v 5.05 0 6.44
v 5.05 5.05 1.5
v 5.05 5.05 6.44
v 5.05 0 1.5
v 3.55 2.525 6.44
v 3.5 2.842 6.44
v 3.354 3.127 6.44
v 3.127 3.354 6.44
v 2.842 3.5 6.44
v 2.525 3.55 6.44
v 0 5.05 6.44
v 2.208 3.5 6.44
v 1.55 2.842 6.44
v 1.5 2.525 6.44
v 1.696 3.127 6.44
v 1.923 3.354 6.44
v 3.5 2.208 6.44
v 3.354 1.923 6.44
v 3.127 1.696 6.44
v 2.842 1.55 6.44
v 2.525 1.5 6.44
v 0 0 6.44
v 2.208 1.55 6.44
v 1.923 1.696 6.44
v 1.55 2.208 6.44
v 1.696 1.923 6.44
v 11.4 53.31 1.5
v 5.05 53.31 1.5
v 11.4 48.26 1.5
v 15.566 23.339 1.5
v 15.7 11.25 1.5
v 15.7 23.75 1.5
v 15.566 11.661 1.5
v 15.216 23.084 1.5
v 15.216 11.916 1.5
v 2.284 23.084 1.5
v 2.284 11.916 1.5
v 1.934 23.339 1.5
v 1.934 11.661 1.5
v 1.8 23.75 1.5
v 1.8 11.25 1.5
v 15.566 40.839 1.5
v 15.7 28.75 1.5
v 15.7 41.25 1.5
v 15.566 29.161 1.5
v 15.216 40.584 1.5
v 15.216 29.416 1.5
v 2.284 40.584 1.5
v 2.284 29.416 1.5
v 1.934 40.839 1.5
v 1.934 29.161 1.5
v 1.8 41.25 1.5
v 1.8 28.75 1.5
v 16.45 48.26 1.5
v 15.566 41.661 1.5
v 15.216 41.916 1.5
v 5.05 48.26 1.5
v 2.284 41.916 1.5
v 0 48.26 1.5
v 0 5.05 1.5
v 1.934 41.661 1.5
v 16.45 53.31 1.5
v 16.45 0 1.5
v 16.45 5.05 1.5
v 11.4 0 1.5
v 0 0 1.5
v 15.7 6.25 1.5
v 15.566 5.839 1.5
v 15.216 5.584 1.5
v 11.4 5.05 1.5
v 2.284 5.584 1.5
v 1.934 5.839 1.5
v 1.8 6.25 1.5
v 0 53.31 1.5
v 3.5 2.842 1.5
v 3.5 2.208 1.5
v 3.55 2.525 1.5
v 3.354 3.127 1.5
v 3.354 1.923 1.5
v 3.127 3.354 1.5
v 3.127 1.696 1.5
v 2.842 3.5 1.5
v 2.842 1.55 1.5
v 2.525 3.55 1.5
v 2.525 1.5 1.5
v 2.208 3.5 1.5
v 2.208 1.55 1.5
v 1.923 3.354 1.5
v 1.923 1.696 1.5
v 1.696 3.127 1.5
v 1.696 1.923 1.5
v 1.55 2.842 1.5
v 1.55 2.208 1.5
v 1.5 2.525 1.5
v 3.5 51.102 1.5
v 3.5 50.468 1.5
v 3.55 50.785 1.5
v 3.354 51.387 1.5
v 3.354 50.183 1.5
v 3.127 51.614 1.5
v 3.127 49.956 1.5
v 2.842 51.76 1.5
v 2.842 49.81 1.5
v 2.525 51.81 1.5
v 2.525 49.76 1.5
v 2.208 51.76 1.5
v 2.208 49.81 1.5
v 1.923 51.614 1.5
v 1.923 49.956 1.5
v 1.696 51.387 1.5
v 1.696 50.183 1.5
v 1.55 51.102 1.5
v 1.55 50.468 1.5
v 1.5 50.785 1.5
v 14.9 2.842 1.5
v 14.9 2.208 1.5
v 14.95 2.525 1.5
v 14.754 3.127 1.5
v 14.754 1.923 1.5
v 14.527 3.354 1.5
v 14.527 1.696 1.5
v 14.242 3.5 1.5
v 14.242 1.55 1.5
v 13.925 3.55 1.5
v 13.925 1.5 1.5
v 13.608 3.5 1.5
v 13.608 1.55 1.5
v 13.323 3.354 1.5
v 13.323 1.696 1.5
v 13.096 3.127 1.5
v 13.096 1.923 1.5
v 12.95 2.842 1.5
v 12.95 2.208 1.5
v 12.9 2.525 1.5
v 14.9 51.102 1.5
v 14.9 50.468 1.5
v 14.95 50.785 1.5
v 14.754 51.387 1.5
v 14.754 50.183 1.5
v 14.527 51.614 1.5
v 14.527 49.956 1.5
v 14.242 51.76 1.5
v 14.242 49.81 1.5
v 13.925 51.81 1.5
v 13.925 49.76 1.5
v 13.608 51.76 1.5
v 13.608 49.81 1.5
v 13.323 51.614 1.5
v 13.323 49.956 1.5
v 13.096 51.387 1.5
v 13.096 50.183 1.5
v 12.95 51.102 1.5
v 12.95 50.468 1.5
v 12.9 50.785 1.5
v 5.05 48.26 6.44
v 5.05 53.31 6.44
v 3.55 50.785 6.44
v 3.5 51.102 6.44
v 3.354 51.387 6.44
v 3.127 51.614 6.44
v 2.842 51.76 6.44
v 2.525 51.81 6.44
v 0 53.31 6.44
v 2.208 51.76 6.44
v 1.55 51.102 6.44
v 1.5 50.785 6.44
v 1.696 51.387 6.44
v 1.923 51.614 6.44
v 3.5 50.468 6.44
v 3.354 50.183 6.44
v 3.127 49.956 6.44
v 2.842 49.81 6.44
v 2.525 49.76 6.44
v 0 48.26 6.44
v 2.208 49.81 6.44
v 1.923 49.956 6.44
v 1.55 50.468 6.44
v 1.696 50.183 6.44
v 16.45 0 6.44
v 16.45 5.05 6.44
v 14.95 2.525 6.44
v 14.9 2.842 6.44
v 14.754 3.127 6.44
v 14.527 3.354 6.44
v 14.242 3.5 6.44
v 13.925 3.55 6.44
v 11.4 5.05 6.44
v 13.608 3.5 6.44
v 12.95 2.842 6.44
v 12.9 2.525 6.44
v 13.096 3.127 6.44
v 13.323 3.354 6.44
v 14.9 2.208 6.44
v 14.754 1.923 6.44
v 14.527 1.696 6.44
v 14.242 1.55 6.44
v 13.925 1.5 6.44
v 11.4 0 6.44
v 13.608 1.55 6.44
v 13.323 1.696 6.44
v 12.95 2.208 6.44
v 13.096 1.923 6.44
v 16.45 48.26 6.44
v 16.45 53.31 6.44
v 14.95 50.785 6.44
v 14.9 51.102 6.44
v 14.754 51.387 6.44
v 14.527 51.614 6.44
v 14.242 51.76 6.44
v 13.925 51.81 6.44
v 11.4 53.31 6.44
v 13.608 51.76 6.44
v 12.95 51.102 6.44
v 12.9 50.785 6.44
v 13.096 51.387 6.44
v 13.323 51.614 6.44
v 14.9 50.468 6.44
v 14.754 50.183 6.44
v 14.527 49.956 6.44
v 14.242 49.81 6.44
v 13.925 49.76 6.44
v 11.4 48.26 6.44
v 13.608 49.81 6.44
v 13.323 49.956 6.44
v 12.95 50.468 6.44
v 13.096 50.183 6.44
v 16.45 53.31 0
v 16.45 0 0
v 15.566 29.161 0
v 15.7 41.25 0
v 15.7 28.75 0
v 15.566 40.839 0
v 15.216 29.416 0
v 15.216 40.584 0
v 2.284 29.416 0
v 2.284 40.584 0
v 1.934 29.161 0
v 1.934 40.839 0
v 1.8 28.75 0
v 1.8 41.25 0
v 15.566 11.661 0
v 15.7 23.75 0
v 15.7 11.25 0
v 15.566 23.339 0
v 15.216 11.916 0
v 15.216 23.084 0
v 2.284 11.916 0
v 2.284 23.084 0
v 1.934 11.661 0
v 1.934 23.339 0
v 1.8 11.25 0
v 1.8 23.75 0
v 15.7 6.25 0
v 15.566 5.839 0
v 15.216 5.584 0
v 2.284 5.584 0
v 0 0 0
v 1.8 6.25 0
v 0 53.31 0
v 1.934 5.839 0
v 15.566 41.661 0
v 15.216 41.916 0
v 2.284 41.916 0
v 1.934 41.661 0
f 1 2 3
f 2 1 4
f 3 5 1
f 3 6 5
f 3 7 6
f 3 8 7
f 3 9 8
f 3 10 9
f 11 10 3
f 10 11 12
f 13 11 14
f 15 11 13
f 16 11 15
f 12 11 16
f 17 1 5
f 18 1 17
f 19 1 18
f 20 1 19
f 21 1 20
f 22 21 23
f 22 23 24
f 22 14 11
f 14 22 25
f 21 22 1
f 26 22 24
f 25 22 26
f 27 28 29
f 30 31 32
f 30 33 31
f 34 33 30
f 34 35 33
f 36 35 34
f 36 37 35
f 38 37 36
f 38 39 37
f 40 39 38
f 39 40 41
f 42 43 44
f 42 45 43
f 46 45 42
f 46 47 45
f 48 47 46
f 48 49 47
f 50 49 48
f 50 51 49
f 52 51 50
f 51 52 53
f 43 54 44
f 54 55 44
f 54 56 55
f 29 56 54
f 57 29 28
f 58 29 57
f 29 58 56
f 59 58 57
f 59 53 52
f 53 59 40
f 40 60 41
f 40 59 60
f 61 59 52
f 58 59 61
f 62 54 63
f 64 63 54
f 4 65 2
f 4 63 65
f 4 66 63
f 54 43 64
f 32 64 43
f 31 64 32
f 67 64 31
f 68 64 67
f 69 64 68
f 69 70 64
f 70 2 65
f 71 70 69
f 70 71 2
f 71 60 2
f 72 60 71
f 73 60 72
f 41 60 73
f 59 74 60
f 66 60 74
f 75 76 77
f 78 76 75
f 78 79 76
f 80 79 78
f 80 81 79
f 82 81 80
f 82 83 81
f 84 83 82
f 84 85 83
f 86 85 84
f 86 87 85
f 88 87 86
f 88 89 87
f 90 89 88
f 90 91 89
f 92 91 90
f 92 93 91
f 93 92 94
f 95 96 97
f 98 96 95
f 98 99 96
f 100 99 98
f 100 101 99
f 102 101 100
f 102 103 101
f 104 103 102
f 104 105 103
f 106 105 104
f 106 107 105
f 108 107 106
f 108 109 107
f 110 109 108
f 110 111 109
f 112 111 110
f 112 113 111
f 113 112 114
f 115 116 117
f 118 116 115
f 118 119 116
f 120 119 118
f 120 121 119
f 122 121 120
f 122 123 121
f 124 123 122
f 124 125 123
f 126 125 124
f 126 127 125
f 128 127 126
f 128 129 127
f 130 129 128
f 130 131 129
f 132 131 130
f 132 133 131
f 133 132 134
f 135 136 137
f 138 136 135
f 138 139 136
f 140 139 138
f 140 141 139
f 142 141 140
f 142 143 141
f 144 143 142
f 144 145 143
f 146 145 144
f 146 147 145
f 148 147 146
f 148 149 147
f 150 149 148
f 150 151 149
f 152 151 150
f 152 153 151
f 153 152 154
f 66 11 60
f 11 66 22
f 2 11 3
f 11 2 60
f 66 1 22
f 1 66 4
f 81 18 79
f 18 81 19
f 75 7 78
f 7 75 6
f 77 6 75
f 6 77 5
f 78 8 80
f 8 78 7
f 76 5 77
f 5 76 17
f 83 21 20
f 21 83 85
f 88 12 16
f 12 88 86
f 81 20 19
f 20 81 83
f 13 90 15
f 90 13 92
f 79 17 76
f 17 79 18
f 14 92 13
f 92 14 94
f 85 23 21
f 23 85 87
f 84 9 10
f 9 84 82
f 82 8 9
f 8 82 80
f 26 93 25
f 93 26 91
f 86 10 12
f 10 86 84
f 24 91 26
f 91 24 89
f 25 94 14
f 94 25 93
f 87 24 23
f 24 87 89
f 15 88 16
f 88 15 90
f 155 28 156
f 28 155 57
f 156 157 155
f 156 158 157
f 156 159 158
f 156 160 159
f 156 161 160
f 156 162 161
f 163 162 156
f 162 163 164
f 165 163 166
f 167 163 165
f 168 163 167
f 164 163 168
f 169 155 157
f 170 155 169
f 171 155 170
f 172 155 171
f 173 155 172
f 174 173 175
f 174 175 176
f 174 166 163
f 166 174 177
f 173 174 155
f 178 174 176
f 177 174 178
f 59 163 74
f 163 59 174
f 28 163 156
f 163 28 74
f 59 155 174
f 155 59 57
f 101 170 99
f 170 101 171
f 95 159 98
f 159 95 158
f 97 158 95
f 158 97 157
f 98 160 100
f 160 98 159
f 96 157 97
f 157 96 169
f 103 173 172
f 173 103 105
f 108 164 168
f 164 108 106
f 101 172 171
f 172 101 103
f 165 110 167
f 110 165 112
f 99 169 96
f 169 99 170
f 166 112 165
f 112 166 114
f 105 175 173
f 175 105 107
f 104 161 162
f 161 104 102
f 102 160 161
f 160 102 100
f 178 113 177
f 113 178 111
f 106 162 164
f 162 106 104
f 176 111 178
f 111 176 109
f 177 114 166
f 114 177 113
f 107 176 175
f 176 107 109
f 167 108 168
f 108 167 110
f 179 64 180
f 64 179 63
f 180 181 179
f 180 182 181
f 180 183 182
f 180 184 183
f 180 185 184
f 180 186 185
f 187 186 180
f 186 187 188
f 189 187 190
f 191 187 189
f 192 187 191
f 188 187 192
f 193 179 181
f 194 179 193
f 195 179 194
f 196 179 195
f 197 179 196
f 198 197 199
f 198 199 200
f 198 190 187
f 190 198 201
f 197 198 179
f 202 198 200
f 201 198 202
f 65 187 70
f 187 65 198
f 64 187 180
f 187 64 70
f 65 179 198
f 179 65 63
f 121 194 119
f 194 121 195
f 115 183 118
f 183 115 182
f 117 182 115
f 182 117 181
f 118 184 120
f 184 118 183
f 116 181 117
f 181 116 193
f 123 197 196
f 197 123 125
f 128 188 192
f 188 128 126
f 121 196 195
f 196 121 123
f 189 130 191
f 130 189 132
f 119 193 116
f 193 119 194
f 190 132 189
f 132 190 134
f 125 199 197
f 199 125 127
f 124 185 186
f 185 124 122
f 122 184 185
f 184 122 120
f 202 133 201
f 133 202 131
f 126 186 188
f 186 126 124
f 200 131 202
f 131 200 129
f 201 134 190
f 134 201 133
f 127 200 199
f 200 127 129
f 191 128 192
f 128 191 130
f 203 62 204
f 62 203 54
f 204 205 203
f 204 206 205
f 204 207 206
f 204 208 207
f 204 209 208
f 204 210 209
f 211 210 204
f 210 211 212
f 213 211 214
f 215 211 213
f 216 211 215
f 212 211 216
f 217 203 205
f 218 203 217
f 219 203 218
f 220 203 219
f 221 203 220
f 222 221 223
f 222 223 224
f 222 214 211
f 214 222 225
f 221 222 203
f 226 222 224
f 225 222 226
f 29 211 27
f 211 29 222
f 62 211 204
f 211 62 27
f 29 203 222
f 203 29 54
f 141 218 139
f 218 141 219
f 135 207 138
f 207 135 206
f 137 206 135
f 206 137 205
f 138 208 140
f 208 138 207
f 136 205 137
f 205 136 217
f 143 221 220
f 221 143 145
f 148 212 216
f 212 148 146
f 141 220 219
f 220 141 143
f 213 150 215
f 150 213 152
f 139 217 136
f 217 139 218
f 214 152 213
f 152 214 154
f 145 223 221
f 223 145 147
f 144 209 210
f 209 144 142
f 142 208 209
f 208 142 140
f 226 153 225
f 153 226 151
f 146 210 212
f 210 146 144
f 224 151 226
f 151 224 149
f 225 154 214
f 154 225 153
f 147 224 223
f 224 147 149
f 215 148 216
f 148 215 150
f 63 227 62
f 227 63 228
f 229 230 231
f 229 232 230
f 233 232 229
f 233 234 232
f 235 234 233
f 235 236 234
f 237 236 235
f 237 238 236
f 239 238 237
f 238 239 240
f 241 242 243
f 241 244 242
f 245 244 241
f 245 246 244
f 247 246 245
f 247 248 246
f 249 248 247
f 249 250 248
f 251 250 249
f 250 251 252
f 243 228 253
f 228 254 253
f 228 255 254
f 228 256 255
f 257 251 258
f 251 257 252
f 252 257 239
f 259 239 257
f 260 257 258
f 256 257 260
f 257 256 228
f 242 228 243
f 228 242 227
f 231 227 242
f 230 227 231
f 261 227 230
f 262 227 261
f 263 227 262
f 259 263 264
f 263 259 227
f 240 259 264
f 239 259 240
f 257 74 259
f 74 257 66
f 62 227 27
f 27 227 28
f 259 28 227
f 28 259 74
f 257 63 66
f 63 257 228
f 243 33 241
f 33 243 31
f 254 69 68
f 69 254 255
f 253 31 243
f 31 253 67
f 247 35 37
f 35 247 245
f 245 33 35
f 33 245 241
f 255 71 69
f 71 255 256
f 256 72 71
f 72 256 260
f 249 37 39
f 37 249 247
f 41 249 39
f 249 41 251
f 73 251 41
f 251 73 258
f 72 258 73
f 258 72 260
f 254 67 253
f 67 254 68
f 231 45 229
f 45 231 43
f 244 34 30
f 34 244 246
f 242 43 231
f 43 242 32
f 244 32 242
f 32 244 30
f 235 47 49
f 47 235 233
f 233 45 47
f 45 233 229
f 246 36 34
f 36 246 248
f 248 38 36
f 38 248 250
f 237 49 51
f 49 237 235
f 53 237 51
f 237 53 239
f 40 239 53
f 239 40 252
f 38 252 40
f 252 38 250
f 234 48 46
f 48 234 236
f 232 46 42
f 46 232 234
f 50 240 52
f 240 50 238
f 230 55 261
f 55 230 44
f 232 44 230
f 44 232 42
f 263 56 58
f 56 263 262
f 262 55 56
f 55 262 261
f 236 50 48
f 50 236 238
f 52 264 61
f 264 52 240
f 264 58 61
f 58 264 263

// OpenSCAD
pico = [11.4, 48.26, 1.06];
r = (2.1 - 0.05)/2;
l = 6 - pico.z;
t = 1.5;

r0 = 0.7;

difference(){
    union(){
        cube([pico.x + 2*(r + t), pico.y + 2*(r + t), t]);
        for (x = [0, 1]){
            for (y = [0, 1]){
                translate([x*pico.x + t + r, y*pico.y + t + r])
                difference(){
                    translate([0, 0, t + l/2])
                    cube([2*(r+t), 2*(r+t), l], center=true);
                    translate([0, 0, t])
                    cylinder(l, r, r, $fn=20);
                }
            }
        }
    }
    hull()
    for (y = [0, 5]){
        for (x = [0, 2.5, 5, 7.5, 10, 12.5]){
            translate([x + 2.5, y + 12.5/2, 0])
            cylinder(t, r0, r0, $fn=10);
        }
    }
    hull()
    for (y = [17.5, 22.5]){
        for (x = [0, 2.5, 5, 7.5, 10, 12.5]){
            translate([x + 2.5, y + 12.5/2, 0])
            cylinder(t, r0, r0, $fn=10);
        }
    }
    
    hull()
    for (y = [22.5 + 12.5]){
        for (x = [0, 2.5, 5, 7.5, 10, 12.5]){
            translate([x + 2.5, y + 12.5/2, 0])
            cylinder(t, r0, r0, $fn=10);
        }
    }
}
